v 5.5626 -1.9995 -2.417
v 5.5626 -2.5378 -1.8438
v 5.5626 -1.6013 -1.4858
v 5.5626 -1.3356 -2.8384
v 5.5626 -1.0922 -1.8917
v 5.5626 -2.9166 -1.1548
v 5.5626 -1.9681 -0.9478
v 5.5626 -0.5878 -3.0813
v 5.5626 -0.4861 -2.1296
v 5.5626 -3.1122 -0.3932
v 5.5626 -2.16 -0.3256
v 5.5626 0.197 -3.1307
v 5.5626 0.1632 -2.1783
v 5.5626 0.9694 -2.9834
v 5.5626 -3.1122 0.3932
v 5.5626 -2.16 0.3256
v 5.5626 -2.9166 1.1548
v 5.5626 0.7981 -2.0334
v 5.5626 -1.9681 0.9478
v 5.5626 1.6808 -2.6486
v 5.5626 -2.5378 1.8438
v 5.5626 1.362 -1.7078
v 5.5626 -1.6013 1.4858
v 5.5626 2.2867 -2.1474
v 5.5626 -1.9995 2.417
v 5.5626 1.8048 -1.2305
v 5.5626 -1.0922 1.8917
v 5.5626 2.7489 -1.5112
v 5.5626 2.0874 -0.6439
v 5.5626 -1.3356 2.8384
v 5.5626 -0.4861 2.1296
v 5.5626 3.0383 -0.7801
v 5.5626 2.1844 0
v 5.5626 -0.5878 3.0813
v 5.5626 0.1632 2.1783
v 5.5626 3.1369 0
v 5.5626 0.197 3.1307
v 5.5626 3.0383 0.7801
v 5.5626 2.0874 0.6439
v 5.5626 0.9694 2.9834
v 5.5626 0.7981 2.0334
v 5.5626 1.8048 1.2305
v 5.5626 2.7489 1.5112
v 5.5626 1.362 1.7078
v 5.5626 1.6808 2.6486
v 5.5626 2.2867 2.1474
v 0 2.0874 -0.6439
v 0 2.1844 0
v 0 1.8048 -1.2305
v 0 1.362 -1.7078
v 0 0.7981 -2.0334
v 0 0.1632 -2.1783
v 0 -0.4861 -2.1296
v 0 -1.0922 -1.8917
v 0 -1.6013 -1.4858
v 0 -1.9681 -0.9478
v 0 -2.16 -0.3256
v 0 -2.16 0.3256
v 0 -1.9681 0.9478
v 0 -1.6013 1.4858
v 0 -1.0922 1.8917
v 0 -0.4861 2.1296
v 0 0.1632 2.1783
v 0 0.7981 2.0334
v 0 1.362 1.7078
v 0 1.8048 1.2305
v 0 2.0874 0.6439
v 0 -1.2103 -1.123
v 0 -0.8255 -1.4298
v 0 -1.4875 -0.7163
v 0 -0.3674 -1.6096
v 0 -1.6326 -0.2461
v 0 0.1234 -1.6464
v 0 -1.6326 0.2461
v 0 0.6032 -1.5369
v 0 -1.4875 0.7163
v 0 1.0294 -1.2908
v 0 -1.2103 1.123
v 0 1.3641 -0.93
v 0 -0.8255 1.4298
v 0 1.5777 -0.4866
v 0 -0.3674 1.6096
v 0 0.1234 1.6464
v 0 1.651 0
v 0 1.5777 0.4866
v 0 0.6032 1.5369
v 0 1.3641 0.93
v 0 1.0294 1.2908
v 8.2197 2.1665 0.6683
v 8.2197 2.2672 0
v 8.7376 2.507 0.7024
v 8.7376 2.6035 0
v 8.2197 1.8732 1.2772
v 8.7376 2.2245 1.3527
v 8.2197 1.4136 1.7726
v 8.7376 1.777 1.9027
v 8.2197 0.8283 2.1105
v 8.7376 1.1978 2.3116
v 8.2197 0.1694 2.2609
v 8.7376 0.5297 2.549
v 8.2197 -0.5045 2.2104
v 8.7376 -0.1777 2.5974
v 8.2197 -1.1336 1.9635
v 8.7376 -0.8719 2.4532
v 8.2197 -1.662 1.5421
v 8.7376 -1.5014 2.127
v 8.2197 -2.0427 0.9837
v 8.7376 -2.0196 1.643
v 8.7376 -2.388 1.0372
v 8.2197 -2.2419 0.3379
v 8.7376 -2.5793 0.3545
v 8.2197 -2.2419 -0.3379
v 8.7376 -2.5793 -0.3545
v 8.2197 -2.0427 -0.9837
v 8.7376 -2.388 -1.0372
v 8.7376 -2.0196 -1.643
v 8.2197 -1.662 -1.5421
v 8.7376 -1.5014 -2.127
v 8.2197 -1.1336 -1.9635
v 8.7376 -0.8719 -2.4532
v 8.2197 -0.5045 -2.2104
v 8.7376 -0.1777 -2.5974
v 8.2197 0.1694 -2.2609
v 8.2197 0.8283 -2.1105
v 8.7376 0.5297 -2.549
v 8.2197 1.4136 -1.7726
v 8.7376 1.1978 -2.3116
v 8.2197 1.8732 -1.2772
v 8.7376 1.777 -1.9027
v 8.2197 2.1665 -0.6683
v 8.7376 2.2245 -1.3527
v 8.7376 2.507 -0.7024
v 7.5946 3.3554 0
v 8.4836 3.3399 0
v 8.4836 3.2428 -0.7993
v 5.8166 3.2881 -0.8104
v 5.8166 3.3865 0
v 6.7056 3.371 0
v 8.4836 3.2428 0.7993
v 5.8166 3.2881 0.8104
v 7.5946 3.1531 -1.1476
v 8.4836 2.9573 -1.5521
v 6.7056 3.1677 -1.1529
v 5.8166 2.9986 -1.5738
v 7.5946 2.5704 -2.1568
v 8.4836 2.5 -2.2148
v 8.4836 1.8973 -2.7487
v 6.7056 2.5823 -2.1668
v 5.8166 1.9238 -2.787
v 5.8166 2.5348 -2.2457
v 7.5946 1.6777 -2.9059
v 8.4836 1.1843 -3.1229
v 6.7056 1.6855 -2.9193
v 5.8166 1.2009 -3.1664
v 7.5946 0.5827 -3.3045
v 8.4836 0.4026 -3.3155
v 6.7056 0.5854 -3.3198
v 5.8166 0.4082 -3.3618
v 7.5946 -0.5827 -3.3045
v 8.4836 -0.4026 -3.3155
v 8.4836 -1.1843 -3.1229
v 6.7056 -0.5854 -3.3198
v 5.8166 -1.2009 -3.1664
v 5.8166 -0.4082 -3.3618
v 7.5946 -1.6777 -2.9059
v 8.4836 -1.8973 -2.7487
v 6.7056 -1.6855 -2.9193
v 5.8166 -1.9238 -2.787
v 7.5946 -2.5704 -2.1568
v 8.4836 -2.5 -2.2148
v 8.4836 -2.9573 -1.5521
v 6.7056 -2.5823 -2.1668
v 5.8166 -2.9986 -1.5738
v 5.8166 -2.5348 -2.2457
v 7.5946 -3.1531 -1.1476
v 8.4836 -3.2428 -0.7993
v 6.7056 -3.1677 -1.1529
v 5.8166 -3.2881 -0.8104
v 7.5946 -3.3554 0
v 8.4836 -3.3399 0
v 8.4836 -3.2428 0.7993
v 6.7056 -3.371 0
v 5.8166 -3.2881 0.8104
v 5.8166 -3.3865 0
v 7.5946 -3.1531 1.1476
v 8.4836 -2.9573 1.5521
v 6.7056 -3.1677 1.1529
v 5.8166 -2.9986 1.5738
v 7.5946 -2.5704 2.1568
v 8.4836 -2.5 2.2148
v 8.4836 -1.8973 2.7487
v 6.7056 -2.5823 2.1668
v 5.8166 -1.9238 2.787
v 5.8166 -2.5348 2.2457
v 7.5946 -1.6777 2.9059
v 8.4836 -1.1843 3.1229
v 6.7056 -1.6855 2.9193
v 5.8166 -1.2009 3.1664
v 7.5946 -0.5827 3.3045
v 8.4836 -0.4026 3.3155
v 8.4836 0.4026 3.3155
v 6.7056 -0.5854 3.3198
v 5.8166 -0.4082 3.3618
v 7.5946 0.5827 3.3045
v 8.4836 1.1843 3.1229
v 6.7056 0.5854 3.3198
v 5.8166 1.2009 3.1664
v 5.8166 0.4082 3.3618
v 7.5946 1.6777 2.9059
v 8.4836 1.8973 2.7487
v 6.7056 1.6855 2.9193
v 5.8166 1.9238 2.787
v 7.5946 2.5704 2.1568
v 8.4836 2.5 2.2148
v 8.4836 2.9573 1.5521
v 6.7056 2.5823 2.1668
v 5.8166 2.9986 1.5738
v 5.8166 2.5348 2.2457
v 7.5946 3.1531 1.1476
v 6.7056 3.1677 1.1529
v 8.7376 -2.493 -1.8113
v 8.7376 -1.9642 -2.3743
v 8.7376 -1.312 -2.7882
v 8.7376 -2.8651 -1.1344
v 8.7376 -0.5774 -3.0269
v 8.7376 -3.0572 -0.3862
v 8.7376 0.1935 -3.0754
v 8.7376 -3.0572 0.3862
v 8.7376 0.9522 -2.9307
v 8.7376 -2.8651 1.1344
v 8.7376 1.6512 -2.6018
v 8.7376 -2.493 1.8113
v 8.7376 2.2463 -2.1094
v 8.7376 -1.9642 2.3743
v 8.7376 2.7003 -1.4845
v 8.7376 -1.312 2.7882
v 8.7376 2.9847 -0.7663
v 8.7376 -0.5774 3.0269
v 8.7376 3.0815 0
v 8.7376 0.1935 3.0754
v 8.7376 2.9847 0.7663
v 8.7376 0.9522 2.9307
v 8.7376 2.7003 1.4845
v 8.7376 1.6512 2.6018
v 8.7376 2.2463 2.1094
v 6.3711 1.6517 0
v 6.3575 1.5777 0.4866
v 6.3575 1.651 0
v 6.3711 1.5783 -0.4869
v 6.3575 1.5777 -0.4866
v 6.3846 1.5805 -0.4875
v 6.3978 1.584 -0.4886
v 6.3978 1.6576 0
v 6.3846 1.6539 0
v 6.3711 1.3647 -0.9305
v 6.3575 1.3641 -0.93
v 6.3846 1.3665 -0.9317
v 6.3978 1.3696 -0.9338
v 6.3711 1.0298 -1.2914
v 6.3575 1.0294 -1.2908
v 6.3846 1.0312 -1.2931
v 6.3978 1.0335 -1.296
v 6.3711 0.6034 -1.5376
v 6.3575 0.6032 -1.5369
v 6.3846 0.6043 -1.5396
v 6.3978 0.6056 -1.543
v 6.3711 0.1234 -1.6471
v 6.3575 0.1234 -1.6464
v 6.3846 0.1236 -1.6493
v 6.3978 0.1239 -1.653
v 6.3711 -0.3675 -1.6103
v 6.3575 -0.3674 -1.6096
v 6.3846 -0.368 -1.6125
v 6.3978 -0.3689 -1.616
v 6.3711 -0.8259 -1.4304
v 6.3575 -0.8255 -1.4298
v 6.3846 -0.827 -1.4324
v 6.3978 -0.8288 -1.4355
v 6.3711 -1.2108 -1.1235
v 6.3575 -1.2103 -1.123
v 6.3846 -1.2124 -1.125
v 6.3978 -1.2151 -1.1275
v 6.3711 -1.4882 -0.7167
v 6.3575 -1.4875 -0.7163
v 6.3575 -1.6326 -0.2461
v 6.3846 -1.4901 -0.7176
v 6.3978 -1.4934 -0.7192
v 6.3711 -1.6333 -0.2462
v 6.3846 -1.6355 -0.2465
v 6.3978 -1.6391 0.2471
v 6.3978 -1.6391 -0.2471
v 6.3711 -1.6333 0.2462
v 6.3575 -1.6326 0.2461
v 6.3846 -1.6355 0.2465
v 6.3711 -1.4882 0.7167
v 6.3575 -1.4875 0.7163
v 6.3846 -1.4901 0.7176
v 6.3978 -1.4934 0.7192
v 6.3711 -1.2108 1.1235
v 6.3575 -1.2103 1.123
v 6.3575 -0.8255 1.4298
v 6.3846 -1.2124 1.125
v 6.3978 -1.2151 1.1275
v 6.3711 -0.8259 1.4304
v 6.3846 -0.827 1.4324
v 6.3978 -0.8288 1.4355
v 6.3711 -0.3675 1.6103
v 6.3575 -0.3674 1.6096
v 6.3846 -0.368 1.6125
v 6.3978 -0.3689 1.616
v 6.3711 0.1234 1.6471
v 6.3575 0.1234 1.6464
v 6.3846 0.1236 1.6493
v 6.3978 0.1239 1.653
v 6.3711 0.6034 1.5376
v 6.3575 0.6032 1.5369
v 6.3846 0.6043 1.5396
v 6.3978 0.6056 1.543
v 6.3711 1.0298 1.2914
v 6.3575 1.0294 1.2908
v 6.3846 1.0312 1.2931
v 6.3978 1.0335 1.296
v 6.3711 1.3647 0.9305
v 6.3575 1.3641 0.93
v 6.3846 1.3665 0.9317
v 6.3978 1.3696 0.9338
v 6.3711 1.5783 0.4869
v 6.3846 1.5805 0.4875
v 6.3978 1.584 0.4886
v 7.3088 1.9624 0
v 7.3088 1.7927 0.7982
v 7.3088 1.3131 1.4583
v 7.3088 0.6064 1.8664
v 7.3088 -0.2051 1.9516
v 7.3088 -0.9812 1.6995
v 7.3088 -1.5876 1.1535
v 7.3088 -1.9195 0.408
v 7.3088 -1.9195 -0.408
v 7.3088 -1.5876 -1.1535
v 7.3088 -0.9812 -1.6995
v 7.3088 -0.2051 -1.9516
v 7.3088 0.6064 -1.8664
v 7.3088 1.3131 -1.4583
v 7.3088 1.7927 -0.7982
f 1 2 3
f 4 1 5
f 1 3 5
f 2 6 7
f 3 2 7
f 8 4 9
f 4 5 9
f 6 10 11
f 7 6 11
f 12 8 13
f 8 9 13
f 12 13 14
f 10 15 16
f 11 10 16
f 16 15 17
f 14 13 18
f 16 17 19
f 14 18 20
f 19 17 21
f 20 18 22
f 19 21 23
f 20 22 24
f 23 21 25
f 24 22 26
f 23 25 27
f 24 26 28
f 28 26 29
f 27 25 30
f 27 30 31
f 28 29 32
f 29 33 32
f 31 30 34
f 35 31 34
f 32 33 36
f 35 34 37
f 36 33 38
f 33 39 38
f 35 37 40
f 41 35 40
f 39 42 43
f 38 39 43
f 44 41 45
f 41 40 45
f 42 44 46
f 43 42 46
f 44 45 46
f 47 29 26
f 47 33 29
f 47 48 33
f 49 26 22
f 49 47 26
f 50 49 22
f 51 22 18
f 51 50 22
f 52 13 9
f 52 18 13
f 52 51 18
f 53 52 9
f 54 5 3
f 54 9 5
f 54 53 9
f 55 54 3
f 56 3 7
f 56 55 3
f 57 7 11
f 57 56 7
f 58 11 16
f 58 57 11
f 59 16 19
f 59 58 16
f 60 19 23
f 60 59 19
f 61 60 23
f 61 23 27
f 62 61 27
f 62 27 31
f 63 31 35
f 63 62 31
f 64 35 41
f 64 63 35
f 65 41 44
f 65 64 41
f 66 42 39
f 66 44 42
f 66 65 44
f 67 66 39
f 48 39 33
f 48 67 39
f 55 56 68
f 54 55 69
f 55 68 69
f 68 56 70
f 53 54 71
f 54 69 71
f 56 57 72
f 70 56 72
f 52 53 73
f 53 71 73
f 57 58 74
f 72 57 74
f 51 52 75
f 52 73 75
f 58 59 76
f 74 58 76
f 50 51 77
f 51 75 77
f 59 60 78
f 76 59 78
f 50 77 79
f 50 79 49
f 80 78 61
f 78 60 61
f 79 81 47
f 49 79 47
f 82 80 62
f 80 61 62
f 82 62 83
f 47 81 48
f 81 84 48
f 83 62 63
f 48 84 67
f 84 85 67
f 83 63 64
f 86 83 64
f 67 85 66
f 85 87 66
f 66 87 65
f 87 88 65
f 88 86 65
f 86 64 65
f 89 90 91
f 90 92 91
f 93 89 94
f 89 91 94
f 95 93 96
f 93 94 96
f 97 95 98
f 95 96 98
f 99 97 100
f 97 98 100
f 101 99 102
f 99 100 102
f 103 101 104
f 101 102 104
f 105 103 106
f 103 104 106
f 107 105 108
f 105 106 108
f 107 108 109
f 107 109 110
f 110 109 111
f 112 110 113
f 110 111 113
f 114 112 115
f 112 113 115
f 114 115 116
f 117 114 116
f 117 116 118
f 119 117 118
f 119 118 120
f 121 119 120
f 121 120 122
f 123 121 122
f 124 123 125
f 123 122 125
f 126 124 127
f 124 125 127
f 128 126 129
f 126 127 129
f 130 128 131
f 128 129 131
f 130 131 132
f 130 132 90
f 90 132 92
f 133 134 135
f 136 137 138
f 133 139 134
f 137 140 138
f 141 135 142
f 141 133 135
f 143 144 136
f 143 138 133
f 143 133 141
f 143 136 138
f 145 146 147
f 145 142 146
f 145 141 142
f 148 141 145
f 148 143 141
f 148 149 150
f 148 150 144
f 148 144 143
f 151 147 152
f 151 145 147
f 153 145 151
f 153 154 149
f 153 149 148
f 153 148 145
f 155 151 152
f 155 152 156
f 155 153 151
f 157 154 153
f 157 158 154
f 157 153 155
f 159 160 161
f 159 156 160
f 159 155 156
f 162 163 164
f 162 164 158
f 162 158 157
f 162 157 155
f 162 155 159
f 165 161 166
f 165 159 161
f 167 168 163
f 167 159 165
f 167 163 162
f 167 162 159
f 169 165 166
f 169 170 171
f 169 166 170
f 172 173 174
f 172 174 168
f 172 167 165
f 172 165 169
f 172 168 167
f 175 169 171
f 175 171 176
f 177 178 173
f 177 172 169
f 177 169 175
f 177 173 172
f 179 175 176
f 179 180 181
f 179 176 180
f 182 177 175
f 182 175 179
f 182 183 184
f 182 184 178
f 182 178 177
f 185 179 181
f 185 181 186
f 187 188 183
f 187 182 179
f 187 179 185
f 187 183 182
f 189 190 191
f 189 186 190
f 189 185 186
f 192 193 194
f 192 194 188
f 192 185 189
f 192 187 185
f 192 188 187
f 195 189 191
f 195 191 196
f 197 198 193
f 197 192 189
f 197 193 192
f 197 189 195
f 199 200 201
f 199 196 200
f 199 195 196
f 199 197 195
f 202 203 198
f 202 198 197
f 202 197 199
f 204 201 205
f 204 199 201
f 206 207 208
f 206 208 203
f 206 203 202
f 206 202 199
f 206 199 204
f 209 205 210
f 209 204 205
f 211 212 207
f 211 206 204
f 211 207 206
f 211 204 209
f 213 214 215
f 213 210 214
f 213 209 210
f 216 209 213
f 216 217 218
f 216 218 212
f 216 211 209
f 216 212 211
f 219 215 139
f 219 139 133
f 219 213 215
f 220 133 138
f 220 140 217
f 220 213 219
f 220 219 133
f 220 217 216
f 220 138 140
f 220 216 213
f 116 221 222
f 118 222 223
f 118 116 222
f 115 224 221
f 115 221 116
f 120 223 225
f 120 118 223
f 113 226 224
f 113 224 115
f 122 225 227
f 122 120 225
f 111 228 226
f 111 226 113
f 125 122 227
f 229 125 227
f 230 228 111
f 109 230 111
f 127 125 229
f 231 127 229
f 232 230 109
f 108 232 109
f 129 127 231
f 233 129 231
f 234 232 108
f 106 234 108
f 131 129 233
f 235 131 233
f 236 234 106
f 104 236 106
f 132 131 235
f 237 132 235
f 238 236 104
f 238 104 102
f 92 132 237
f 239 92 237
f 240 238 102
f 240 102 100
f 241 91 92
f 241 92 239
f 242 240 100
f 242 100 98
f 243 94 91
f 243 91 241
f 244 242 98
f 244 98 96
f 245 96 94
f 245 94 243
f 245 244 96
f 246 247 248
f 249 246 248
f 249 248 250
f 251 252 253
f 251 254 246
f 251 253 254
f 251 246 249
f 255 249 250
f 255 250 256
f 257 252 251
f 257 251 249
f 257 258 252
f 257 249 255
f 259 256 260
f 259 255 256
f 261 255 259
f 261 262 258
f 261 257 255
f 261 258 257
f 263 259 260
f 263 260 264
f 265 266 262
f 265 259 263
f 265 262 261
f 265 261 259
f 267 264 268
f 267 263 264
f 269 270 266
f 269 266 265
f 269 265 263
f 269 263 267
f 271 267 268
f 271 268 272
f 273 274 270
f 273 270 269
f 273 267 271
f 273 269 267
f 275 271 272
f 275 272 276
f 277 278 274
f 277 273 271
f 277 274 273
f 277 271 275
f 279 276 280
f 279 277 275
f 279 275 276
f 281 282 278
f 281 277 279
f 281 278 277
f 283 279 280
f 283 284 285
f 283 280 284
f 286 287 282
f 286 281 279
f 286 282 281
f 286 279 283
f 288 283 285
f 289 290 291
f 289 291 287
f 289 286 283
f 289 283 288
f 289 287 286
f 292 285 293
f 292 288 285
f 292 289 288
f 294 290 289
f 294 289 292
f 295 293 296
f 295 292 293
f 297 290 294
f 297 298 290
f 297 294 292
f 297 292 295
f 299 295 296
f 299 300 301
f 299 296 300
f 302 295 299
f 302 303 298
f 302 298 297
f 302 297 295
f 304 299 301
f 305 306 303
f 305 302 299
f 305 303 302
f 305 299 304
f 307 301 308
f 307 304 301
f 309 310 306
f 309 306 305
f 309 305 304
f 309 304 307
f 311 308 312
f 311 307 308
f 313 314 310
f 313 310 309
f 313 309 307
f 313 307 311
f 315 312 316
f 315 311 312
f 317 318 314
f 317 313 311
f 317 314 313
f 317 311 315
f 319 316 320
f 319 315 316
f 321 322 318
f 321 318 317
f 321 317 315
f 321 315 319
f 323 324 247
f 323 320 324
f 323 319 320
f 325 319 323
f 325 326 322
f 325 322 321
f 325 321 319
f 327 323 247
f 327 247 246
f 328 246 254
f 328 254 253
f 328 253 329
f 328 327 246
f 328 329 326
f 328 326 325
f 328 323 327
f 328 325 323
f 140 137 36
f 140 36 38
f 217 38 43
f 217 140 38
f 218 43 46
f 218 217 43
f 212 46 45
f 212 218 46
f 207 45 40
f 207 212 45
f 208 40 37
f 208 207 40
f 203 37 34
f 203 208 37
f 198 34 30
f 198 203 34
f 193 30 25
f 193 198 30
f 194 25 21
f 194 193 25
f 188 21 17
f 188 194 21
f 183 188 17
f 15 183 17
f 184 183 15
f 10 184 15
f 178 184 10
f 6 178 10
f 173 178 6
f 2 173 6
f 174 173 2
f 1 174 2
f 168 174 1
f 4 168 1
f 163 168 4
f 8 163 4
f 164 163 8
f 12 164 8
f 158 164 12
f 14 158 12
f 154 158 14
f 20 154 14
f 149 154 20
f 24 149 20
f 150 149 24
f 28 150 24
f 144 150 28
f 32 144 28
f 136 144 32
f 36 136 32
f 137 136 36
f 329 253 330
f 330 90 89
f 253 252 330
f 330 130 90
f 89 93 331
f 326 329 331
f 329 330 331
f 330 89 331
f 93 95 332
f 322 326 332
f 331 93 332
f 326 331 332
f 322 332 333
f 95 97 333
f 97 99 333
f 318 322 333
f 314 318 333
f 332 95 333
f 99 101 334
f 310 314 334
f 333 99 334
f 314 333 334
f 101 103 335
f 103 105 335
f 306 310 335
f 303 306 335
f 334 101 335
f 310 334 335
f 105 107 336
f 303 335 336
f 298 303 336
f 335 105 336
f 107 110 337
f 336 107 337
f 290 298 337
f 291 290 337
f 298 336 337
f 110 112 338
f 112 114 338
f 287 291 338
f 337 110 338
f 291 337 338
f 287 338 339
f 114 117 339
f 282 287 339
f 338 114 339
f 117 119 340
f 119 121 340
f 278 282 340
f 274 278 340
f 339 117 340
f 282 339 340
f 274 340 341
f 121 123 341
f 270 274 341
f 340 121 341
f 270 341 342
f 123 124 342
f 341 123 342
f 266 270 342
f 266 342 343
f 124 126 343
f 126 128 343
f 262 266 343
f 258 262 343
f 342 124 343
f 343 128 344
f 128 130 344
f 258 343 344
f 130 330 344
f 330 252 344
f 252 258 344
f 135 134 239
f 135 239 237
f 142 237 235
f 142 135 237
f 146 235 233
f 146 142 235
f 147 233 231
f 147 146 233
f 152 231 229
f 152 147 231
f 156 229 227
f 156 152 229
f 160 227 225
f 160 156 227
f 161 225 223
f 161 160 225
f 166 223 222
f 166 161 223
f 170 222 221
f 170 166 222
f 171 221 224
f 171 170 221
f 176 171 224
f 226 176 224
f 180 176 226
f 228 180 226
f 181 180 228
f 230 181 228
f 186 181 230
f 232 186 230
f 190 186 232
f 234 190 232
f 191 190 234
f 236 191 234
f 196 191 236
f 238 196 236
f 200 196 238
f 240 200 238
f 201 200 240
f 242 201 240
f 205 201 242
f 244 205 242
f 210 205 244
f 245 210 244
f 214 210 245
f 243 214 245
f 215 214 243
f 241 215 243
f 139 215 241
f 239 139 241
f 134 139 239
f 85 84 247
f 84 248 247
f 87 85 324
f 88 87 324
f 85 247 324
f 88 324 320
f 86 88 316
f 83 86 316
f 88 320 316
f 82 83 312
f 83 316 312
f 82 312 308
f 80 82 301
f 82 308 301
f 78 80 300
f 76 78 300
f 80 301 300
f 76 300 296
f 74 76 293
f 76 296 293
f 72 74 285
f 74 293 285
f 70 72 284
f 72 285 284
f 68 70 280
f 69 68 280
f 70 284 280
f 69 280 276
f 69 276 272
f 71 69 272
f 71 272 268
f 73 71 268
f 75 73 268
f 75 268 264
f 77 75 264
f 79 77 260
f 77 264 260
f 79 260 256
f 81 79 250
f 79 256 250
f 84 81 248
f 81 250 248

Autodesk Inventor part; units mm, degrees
ref_plane "YZ Plane" through (0, 0, 0) normal (1, 0, 0) x (0, 1, 0)
ref_plane "XZ Plane" through (0, 0, 0) normal (0, 1, 0) x (-1, 0, 0)
ref_plane "XY Plane" through (0, 0, 0) normal (0, 0, 1) x (1, 0, 0)
sketch "Sketch1" plane through (0, 0, 0) normal (0, 0, 1) x (1, 0, 0)
  line L0 (0, 1.651) -> (6.3575, 1.651)
  line L1 (6.3978, 1.6576) -> (8.2197, 2.2672)
  line L2 (8.2197, 2.2672) -> (8.7376, 2.6035)
  line L3 (8.7376, 2.6035) -> (8.7376, 3.0815)
  line L4 (8.4836, 3.3399) -> (5.8166, 3.3865)
  line L5 (5.5626, 3.1369) -> (5.5626, 2.1844)
  line L6 (5.5626, 2.1844) -> (0, 2.1844)
  line L7 (0, 2.1844) -> (0, 1.651)
  line L8 (5.8166, 3.3865) -> (5.5626, 3.1369)
  line L9 (8.4836, 3.3399) -> (8.7376, 3.0815)
  arc A0 (6.3575, 1.651) -> (6.3978, 1.6576) centre (6.3575, 1.778) ccw
  line L10 (-6.035, 0) -> (36.2102, 0) projected
  point P0 (0, 0)
  point P1 (8.7376, 3.3355)
  point P2 (5.5626, 3.3909)
  dimension "d0" = 18.5
  dimension "d1" = 33
  dimension "d2" = 89
  dimension "d3" = 3.3909
  dimension "d4" = 2.1844
  dimension "d5" = 1.651
  dimension "d6" = 8.7376
  dimension "d7" = 2.6035
  dimension "d8" = 2.2672
  dimension "d9" = 3.175
  dimension "d10" = 0.254
  dimension "d11" = 0.254
  dimension "d12" = 0.254
  dimension "d13" = 0.254
  dimension "d14" = 0.127
  dimension "d16" = 0.0066
revolve "Revolution1" add sketch "Sketch1" angle 360 about axis through (-10, 0, 0) along (1, 0, 0)
equation "\"d3\" = 0.5 * MS20819_G"
equation "\"d4\" = 0.5 * MS20819_C"
equation "\"d5\" = 0.5 * MS20819_B"
equation "\"d6\" = MS20819_M"
equation "\"d7\" = 0.5 * MS20819_F"
equation "\"d8\" = 0.5 * MS20819_N + d16"
equation "\"d9\" = MS20819_J"
equation "\"d11\" = d10"
equation "\"d12\" = d10"
equation "\"d13\" = d12"
equation "\"d14\" = MS20819_R"
equation "\"MS20819_B\" = 3.302"
equation "\"MS20819_C\" = 4.3688"
equation "\"MS20819_F\" = 5.207"
equation "\"MS20819_G\" = 6.7818"
equation "\"MS20819_J\" = 3.175"
equation "\"MS20819_M\" = 8.7376"
equation "\"MS20819_N\" = 4.5212"
equation "\"MS20819_R\" = 0.127"
equation "\"Tube_OD\" = 3.175"
properties part number "MS20819-2D" material "Aluminum 2014-T6"
